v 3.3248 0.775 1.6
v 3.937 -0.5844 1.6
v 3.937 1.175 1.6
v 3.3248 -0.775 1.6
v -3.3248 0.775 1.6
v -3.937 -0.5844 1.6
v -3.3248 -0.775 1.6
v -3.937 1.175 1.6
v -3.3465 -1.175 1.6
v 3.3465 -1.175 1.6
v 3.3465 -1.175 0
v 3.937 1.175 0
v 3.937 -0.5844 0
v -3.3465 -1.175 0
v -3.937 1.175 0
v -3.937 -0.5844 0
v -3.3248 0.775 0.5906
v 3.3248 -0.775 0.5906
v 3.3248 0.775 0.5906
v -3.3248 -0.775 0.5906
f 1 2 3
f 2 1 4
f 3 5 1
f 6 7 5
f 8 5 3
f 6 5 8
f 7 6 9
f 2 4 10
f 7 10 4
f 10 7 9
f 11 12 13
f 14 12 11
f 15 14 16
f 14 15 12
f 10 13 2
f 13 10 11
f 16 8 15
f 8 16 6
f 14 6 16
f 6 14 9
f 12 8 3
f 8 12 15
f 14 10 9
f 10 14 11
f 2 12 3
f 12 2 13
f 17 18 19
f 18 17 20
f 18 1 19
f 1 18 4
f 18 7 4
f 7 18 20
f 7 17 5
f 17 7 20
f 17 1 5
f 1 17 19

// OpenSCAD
//  OpenSCAD model of the Samtec BTH-030-01 connector (body only)
//  5/30/14 By F. Huettig, Adapteva, Inc.
//  Free for any use, no warrantees.

width = 20;  // mm
depth = 5.969;
chamfer = 1.5;
i_wid = 16.89;  // width/depth of 'cutout'
i_depth = 3.937;
height = 4.064;
innerheight = 1.5;  // Not sure about this one

// derived
xctr = width/2;
yctr = depth/2;
i_left = xctr - (i_wid/2);
i_bot  = yctr - (i_depth/2);

// vertecies of poly's
outer = [
[0, depth],
[width, depth],
[width, chamfer],
[width-chamfer, 0],
[chamfer, 0],
[0, chamfer]
];

inner = [
[i_left, i_bot],
[i_left, depth-i_bot],
[width-i_left, depth-i_bot],
[width-i_left, i_bot]
];

scale(10 / 25.4)   // Wings3D will assume units of 1/10" (??)
	translate([-xctr, -yctr, 0])
		difference() {
		linear_extrude(height, false)
			polygon(outer);

		translate([0, 0, innerheight])
			linear_extrude(height, false)  // intentionally higher than needed?
				polygon(inner);
		}
